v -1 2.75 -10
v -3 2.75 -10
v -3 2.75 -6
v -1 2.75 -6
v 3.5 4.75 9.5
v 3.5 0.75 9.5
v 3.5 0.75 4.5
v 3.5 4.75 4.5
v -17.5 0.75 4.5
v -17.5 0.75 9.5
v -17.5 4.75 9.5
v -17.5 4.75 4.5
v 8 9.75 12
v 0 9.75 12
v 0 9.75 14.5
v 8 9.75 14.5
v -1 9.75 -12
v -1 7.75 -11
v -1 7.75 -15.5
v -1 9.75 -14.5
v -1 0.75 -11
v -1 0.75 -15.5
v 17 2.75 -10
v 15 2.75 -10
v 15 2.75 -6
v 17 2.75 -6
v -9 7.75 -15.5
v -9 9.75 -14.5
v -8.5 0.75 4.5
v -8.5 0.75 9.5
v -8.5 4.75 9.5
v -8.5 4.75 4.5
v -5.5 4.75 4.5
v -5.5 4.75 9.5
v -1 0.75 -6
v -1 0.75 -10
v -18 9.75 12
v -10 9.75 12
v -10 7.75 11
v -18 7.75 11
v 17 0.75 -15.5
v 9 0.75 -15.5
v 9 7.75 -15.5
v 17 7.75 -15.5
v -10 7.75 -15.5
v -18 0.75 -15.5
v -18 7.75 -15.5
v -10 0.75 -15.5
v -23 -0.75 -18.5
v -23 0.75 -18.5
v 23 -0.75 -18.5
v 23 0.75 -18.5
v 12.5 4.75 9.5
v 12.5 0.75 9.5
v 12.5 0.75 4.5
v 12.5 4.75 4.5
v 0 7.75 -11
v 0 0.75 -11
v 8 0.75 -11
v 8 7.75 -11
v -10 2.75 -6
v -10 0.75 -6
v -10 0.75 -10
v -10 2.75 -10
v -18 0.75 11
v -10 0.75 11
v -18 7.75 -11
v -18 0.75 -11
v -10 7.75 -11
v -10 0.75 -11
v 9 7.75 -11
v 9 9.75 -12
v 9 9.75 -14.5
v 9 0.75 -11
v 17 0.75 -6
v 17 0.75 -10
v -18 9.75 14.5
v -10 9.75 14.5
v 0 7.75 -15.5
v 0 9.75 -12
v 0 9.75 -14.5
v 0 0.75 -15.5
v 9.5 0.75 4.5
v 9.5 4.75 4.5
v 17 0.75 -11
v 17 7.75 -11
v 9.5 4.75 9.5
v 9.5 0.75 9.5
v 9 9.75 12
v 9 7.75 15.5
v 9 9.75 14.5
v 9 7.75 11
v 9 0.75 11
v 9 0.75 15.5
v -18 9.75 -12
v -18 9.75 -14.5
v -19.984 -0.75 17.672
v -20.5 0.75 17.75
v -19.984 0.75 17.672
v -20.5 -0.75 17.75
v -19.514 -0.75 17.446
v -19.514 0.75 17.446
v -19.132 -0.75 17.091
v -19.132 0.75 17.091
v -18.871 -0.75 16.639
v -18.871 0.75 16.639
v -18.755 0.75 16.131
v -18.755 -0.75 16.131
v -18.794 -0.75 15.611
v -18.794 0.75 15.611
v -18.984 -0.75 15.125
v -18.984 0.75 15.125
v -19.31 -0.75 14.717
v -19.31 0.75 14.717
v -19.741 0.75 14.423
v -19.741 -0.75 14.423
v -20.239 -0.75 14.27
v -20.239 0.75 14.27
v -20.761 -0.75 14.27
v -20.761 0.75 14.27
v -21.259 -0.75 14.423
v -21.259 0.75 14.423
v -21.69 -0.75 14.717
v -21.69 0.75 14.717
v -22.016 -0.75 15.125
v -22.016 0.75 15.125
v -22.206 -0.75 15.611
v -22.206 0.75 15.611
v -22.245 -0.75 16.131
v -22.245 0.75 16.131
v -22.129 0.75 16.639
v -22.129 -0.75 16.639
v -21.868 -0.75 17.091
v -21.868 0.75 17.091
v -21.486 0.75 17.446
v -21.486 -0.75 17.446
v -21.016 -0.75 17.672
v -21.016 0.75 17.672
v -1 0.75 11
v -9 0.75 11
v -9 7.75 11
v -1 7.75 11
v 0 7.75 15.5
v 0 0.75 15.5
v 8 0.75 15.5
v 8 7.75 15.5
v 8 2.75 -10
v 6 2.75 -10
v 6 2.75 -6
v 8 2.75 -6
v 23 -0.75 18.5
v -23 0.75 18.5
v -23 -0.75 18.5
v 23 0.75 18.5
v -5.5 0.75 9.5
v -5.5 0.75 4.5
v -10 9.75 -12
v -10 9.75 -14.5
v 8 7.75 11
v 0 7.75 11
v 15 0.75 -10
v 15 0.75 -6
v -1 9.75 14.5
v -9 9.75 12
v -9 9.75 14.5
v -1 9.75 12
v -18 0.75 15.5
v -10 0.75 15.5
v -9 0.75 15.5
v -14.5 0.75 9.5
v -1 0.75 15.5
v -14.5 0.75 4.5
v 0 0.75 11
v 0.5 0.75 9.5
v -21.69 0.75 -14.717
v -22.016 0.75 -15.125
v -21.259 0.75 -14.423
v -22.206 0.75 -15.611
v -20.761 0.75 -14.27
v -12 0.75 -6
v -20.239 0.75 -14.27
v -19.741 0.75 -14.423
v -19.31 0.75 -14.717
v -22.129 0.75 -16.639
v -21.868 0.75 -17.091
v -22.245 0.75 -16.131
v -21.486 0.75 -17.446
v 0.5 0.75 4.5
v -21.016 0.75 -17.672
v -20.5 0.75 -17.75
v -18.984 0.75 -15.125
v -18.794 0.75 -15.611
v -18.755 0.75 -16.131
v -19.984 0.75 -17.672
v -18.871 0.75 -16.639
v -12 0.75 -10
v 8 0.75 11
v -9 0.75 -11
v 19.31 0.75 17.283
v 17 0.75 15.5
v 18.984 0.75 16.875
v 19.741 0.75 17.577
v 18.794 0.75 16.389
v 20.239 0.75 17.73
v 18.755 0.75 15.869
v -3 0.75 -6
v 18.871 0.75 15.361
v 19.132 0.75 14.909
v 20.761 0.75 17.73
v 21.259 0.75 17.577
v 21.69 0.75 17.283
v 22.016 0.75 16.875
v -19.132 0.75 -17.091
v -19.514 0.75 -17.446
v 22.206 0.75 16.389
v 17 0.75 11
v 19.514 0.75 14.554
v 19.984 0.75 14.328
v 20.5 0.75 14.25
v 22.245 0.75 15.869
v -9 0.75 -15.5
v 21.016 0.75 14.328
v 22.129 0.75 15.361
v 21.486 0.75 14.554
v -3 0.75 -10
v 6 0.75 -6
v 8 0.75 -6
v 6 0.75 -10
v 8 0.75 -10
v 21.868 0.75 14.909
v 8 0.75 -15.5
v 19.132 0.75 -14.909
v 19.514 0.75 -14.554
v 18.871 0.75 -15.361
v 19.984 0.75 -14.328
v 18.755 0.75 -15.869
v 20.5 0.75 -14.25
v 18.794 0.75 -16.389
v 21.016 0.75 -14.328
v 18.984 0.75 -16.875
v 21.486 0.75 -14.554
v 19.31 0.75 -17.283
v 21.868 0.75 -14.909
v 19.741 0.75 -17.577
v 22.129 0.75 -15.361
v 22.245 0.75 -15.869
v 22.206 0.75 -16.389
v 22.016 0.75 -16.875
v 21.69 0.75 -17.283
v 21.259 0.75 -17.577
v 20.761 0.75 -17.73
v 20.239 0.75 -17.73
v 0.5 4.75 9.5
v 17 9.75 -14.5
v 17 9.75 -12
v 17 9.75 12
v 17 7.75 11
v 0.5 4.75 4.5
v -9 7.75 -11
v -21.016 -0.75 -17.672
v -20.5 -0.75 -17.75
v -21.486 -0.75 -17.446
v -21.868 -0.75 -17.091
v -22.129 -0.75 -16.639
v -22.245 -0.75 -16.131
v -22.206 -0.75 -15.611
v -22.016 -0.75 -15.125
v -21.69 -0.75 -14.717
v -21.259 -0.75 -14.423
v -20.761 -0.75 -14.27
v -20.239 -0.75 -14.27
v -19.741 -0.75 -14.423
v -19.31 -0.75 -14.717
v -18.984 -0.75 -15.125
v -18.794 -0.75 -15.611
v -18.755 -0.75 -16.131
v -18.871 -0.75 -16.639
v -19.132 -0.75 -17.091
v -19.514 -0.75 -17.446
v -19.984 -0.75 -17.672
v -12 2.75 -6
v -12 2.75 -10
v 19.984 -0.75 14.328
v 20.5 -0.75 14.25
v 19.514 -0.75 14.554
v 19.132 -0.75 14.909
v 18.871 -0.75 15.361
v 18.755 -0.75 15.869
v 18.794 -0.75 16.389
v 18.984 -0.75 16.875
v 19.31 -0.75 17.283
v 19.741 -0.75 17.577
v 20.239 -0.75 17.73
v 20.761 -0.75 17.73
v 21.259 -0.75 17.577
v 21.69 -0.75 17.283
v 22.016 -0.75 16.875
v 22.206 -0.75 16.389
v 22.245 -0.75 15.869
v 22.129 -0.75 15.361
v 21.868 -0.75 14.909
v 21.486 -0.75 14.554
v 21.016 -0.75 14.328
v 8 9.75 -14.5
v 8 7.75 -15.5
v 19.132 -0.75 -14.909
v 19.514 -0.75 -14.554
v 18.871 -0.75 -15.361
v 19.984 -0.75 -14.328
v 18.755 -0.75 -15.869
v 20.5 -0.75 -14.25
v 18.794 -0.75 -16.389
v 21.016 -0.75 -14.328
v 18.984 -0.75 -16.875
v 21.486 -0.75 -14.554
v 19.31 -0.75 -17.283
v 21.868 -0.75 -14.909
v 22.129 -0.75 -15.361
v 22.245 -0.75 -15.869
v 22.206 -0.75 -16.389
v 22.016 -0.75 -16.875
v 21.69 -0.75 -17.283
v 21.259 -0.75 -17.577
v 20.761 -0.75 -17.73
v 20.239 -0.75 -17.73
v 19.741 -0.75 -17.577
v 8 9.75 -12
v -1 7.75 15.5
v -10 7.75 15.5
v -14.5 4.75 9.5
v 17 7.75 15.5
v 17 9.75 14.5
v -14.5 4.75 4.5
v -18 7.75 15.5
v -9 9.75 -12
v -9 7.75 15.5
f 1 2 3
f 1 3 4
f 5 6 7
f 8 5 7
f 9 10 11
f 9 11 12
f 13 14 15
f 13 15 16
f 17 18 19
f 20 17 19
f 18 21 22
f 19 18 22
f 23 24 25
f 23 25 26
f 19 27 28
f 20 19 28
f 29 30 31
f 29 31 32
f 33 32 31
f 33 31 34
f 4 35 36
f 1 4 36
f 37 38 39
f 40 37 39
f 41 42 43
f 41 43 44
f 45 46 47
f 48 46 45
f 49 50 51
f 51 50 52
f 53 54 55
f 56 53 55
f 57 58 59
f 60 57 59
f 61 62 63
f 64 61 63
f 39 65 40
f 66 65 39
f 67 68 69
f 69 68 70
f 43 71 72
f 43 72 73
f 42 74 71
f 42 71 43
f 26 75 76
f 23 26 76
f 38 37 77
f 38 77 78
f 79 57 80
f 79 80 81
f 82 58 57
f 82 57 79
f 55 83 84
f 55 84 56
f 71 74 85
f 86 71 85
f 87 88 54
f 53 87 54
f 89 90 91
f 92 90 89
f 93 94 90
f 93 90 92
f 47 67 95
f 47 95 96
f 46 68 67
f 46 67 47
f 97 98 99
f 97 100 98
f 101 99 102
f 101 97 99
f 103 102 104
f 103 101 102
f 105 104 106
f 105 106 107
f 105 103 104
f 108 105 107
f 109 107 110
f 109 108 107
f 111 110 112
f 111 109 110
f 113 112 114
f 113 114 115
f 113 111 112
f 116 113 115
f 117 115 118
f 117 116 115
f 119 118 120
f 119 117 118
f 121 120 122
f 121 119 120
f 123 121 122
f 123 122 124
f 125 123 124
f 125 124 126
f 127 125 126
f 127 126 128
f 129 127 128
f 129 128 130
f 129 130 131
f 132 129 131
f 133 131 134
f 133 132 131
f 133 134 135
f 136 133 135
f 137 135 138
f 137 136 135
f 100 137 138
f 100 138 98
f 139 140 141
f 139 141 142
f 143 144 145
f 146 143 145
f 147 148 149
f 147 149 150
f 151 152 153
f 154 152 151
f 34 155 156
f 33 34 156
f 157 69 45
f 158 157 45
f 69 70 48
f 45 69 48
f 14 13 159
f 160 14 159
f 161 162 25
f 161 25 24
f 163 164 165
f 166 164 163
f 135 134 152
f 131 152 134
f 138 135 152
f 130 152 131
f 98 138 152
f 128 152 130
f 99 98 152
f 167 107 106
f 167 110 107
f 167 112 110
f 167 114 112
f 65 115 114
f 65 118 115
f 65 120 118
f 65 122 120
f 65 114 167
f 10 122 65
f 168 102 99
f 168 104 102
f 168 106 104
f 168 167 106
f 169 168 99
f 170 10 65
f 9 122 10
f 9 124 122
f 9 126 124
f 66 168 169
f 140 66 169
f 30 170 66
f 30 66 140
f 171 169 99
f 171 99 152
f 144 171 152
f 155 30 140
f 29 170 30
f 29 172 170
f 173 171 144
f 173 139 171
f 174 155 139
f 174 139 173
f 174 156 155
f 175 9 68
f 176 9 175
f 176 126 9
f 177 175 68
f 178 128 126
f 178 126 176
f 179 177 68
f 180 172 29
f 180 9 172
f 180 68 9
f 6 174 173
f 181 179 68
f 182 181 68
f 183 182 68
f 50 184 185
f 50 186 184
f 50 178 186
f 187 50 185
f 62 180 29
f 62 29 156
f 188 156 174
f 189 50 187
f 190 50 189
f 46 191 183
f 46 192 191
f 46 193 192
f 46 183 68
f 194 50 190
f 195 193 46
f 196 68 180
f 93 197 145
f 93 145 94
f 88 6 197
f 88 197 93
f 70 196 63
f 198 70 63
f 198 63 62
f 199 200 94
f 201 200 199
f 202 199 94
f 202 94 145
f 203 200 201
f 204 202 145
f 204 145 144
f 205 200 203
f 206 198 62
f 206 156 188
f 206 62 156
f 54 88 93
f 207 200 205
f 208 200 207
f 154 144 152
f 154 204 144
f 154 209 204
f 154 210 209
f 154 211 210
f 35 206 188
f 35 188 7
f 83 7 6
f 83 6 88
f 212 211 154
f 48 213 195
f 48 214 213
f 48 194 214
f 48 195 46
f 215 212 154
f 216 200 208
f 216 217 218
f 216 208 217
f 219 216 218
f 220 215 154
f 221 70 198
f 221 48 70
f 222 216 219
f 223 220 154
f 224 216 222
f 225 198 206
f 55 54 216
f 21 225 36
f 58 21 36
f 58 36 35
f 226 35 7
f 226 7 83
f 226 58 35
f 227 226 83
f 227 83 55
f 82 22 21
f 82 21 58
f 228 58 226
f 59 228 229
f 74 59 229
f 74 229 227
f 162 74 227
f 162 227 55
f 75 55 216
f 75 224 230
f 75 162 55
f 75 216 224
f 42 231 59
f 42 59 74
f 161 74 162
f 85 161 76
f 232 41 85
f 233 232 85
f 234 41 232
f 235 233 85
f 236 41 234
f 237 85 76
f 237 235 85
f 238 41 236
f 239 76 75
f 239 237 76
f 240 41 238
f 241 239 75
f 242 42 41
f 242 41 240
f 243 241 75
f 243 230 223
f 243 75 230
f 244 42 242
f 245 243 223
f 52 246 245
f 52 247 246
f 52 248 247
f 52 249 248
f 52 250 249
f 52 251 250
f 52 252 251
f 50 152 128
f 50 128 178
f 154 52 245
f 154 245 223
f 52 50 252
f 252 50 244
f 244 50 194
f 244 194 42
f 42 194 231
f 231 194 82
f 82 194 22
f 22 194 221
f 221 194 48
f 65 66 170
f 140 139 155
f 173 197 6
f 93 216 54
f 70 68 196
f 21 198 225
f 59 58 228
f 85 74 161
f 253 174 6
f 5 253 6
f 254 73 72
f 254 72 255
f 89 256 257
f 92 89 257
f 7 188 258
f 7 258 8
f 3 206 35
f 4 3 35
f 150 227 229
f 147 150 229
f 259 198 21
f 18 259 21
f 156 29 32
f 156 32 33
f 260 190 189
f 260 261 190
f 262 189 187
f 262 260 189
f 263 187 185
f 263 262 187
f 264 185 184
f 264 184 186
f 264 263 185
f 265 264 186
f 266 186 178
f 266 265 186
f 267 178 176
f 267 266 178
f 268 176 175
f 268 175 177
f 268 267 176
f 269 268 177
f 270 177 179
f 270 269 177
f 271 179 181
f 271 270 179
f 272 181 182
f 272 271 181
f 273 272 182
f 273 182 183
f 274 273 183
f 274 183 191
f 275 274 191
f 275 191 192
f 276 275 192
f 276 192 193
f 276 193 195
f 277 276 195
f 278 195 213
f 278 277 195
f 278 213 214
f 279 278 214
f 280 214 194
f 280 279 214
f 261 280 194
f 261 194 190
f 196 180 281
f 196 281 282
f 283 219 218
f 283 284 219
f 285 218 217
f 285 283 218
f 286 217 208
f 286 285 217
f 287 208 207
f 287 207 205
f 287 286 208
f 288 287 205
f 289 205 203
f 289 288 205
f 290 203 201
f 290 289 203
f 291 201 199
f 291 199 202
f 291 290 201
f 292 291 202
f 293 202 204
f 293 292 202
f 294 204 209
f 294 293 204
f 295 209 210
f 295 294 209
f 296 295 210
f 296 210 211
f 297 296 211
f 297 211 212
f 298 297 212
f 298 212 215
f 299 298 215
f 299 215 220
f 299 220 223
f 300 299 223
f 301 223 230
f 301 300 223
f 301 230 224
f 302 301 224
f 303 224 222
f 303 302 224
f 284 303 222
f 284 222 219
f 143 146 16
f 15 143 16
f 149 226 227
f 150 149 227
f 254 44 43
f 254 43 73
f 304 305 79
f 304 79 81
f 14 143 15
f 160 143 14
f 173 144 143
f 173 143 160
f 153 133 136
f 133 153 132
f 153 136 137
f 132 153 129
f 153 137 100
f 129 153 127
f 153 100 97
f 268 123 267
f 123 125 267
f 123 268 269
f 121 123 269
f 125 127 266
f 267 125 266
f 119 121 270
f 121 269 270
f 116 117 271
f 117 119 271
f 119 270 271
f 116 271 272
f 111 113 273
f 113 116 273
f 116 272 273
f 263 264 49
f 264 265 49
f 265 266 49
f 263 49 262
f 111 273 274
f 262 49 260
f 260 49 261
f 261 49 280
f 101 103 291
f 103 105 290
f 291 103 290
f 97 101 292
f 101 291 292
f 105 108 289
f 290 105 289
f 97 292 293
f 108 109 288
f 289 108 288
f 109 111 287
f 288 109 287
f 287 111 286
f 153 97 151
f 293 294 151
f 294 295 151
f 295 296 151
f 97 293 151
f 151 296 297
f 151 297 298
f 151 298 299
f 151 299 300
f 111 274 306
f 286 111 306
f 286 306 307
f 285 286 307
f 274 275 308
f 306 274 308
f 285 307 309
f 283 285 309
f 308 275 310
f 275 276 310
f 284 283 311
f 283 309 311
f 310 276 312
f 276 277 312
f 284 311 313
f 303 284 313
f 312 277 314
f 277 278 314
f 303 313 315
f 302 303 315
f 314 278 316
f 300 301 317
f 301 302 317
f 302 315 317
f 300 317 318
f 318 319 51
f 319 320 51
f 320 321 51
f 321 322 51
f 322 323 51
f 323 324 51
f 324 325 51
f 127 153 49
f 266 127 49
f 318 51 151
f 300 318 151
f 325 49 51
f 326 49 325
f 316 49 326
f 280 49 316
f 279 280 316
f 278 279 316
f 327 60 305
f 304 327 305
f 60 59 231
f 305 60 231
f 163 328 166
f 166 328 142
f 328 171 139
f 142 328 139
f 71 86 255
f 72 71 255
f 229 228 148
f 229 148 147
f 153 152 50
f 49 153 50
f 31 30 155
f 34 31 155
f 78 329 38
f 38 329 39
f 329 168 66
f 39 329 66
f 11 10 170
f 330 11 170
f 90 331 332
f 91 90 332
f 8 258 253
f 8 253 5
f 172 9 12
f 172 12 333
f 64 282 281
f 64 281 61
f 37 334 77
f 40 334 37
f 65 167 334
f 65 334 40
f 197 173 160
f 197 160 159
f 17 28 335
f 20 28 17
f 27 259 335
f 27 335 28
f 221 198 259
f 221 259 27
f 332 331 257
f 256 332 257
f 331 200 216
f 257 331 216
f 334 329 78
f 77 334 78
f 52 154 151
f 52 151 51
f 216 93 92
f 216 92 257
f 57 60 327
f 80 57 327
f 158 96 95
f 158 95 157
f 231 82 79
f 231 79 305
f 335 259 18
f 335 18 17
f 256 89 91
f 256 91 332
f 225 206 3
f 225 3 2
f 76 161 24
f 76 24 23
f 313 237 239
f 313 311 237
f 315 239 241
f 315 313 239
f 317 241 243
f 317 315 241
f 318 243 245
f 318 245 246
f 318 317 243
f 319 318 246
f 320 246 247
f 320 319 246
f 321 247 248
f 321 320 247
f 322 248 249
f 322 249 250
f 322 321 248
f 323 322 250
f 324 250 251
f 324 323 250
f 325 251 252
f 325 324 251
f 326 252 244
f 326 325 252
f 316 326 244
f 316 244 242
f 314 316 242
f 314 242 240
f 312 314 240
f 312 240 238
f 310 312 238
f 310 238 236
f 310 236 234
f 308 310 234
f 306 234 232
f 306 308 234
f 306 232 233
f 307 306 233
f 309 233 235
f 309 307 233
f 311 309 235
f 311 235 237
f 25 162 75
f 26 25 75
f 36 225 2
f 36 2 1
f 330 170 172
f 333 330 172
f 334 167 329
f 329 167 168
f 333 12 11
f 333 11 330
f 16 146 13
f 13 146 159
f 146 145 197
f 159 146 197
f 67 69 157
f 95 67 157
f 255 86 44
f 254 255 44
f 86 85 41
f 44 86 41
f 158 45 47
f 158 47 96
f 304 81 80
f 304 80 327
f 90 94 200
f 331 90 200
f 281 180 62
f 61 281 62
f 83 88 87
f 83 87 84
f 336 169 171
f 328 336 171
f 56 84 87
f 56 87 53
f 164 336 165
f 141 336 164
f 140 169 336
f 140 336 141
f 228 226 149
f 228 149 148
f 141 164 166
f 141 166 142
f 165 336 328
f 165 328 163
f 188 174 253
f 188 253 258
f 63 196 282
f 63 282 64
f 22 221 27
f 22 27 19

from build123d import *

# Parameters (mm, degrees)
SKETCH1_W           = 46
SKETCH1_H           = 37
SKETCH1_R           = 1.75
BOSS_EXTRUDE1_DEPTH = 0.75
SKETCH2_W           = 8
SKETCH2_H           = 4.5
BOSS_EXTRUDE2_DEPTH = 9
CUT_EXTRUDE2_DEPTH  = 124
SKETCH4_W           = 2
SKETCH4_H           = 4
BOSS_EXTRUDE3_DEPTH = 2
SKETCH5_W           = 3
SKETCH5_H           = 5
BOSS_EXTRUDE4_DEPTH = 4


with BuildPart() as part:
    # Sketch1 → Boss-Extrude1 (new, symmetric)
    with BuildSketch(Plane(origin=(0, 0, 0), x_dir=(1, 0, 0), z_dir=(0, 1, 0))):
        Rectangle(SKETCH1_W, SKETCH1_H)
        with Locations(Location((20.5, 16, 0), (0, 0, 270))):
            Circle(SKETCH1_R, mode=Mode.SUBTRACT)
        with Locations(Location((20.5, -16, 0), (0, 0, 90))):
            Circle(SKETCH1_R, mode=Mode.SUBTRACT)
        with Locations(Location((-20.5, -16, 0), (0, 0, 270))):
            Circle(SKETCH1_R, mode=Mode.SUBTRACT)
        with Locations(Location((-20.5, 16, 0), (0, 0, 90))):
            Circle(SKETCH1_R, mode=Mode.SUBTRACT)
    extrude(amount=BOSS_EXTRUDE1_DEPTH, both=True)

    # Sketch2 → Boss-Extrude2 (add)
    with BuildSketch(Plane(origin=(0, 0.75, 0), x_dir=(1, 0, 0), z_dir=(0, 1, 0))):
        with Locations((13, 13.25)):
            Rectangle(SKETCH2_W, SKETCH2_H)
        with Locations((4, 13.25)):
            Rectangle(SKETCH2_W, SKETCH2_H)
        with Locations((-5, 13.25)):
            Rectangle(SKETCH2_W, SKETCH2_H)
        with Locations((-14, 13.25)):
            Rectangle(SKETCH2_W, SKETCH2_H)
        with Locations((-14, -13.25)):
            Rectangle(SKETCH2_W, SKETCH2_H)
        with Locations((-5, -13.25)):
            Rectangle(SKETCH2_W, SKETCH2_H)
        with Locations((4, -13.25)):
            Rectangle(SKETCH2_W, SKETCH2_H)
        with Locations((13, -13.25)):
            Rectangle(SKETCH2_W, SKETCH2_H)
    extrude(amount=BOSS_EXTRUDE2_DEPTH)

    # Sketch3 → Cut-Extrude2 (cut)
    with BuildSketch(Plane(origin=(17, 0, 0), x_dir=(0, 0, -1), z_dir=(1, 0, 0))):
        Polygon((-15.5, 9.75), (-15.5, 7.75), (-14.5, 9.75), align=None)
        Polygon((-11, 9.75), (-12, 9.75), (-11, 7.75), align=None)
        Polygon((12, 9.75), (11, 9.75), (11, 7.75), align=None)
        Polygon((15.5, 7.75), (14.5, 9.75), (15.5, 9.75), align=None)
    extrude(amount=-CUT_EXTRUDE2_DEPTH, mode=Mode.SUBTRACT)

    # Sketch4 → Boss-Extrude3 (add)
    with BuildSketch(Plane(origin=(0, 0.75, 0), x_dir=(1, 0, 0), z_dir=(0, 1, 0))):
        with Locations((16, 8)):
            Rectangle(SKETCH4_W, SKETCH4_H)
        with Locations((7, 8)):
            Rectangle(SKETCH4_W, SKETCH4_H)
        with Locations((-2, 8)):
            Rectangle(SKETCH4_W, SKETCH4_H)
        with Locations((-11, 8)):
            Rectangle(SKETCH4_W, SKETCH4_H)
    extrude(amount=BOSS_EXTRUDE3_DEPTH)

    # Sketch5 → Boss-Extrude4 (add)
    with BuildSketch(Plane(origin=(0, 0.75, 0), x_dir=(1, 0, 0), z_dir=(0, 1, 0))):
        with Locations((-16, -7)):
            Rectangle(SKETCH5_W, SKETCH5_H)
        with Locations((-7, -7)):
            Rectangle(SKETCH5_W, SKETCH5_H)
        with Locations((2, -7)):
            Rectangle(SKETCH5_W, SKETCH5_H)
        with Locations((11, -7)):
            Rectangle(SKETCH5_W, SKETCH5_H)
    extrude(amount=BOSS_EXTRUDE4_DEPTH)


solid = part.part
